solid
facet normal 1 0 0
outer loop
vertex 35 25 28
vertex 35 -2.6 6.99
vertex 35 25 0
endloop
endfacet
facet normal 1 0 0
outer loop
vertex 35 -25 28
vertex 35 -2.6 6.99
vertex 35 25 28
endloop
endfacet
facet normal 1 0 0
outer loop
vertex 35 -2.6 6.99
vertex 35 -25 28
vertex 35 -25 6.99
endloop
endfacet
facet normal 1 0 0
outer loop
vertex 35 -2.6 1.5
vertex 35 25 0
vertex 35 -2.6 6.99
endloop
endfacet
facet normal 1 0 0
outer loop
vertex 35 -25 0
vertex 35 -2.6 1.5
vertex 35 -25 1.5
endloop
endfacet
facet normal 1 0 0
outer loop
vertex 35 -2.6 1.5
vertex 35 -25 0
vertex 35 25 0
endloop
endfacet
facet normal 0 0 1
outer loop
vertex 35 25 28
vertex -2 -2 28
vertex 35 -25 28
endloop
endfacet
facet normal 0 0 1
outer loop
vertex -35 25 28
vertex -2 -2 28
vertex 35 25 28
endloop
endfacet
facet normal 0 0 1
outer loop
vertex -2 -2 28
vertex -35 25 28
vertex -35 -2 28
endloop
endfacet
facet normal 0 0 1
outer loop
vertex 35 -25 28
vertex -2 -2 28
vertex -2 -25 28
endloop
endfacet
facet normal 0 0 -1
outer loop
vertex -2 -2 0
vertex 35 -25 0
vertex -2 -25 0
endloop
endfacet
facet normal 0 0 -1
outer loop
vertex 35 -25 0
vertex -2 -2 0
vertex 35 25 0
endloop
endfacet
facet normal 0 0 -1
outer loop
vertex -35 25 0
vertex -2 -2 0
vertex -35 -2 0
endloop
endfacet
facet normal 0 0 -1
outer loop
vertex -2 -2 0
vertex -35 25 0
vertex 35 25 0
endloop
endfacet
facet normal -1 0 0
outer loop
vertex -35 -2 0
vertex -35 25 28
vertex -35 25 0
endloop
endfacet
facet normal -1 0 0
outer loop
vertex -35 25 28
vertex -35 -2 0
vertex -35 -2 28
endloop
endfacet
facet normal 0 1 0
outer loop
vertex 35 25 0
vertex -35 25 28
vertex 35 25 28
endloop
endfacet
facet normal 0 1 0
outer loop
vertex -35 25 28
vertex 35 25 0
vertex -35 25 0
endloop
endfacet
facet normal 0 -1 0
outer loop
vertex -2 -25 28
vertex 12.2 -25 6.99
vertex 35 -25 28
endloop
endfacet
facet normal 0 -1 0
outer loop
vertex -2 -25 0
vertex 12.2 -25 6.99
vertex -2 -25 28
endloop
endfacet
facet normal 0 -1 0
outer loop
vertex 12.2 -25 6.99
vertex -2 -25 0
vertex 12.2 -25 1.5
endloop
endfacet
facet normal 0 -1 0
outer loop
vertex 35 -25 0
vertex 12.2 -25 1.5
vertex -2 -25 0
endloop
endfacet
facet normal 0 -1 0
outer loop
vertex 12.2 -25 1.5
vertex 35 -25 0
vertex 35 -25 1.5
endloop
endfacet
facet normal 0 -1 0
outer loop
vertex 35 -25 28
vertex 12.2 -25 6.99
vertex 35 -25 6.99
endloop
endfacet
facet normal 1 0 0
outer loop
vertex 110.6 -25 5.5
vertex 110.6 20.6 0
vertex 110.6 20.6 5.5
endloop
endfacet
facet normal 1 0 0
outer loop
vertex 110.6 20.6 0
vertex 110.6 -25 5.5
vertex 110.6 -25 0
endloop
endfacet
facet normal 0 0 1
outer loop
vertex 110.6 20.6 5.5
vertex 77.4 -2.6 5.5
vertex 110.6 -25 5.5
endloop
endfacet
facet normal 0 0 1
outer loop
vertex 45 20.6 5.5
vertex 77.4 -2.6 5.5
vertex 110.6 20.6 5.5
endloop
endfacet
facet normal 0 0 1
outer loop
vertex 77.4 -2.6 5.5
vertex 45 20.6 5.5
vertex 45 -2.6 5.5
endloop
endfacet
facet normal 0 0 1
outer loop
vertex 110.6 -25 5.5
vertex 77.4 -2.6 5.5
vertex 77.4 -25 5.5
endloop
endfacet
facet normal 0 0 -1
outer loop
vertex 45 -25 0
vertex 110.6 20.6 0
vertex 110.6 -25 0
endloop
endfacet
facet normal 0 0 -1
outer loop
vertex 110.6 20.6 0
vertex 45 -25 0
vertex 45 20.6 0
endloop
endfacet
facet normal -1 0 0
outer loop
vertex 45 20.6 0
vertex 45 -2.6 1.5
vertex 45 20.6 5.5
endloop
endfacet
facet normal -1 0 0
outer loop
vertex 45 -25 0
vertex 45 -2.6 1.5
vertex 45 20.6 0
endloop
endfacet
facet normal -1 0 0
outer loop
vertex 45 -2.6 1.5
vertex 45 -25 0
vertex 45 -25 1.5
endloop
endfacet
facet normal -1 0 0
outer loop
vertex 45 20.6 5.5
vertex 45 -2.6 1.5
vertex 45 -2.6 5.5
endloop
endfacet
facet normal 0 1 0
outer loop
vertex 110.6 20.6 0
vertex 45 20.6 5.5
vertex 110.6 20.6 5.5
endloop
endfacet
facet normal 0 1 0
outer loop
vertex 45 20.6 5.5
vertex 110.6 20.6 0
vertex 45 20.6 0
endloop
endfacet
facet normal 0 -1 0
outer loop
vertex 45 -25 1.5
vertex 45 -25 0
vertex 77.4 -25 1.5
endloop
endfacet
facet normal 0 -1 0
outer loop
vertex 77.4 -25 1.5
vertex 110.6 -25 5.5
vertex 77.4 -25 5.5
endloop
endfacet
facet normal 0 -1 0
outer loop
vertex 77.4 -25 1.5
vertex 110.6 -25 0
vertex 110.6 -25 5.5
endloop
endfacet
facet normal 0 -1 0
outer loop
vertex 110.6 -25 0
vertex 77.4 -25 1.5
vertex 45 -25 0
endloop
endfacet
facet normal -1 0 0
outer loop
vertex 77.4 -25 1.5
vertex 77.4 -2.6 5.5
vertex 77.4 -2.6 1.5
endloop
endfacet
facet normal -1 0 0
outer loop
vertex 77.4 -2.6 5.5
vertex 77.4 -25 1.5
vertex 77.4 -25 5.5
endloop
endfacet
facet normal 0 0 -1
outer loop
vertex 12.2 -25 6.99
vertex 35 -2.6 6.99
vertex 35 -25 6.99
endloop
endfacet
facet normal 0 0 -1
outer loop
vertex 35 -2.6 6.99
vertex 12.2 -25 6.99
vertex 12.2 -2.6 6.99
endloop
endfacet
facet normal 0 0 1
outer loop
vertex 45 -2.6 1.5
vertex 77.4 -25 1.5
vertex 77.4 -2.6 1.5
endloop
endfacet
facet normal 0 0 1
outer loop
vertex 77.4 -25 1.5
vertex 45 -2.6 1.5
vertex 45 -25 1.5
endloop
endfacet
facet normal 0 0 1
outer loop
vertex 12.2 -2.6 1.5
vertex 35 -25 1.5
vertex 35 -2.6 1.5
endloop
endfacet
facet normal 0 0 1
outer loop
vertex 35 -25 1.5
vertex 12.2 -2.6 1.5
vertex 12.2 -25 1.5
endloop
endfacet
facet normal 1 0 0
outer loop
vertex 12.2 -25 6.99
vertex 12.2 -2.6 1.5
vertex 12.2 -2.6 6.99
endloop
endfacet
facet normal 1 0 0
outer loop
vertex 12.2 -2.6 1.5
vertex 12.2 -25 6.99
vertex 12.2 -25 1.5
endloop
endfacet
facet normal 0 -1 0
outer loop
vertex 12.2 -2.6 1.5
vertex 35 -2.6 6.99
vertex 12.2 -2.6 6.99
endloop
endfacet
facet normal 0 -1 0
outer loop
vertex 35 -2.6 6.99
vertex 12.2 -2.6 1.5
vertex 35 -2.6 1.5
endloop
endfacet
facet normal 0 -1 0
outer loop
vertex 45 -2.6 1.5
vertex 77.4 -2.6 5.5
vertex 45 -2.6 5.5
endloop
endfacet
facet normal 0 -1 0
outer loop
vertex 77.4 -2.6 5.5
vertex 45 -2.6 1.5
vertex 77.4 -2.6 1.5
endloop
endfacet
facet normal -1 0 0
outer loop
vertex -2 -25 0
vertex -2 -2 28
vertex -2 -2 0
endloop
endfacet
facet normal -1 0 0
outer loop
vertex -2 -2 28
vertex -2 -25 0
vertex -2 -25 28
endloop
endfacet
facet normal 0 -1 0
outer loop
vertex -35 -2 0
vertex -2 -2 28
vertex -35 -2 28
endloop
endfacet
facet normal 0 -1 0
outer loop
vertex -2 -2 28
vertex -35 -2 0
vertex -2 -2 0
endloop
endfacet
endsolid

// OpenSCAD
// Two-part enclosure for a small electronics board (e.g. Arduino-based temperature logger)
// Print orientation: both parts rest on the bed (z = 0), side by side, 10 mm apart in X.
// The box is open-topped; the lid is a plate with a lip that slides into the box opening.

// ---------------- Parameters ----------------
box_x      = 70;    // box outer length (X)
box_y      = 50;    // box outer width (Y)
box_h      = 30;    // box outer height (Z)
wall       = 2;     // box wall thickness
floor      = 2;     // box floor thickness
lip_t      = 1.5;   // lid lip thickness
lip_h      = 4;     // lid lip height (extends above the plate)
lip_x      = 65.6;  // lid lip outer length (X)
lip_y      = 45.6;  // lid lip outer width (Y)
clearance  = 0.2;   // clearance between lip inner size and box opening
gap        = 10;    // horizontal gap between the two parts
eps        = 0.5;   // cutter overshoot past faces

$fn = 64;

// Derived: lid plate thickness = lip_t + lip_h = 5.5 mm
lid_t = lip_t + lip_h;

// Lip inner size (with clearance on each side)
lip_x_i = lip_x - 2 * clearance;   // 65.2
lip_y_i = lip_y - 2 * clearance;   // 45.2

// Box opening size (inner, above floor and walls)
open_x = box_x - 2 * wall;         // 66
open_y = box_y - 2 * wall;         // 46

// ---------------- Model ----------------
difference() {
    union() {
        // Part 1: box
        translate([-box_x / 2, -box_y / 2, 0])
            cube([box_x, box_y, box_h - floor]);   // floor included in height

        // Part 2: lid (printed upside down)
        translate([box_x / 2 + gap, -box_y / 2, 0])
            cube([lip_x, lip_y, lid_t]);            // plate + lip, centred in X/Y
    }

    // Cut the lip recess into the lid plate, leaving the lip standing above it
    translate([box_x / 2 + gap - lip_x / 2, -box_y / 2 - lip_y / 2, lip_t])
        cube([lip_x_i, lip_y_i, lid_t - 0.01]);

    // Cut the box opening from the top of the box (through the walls and floor)
    translate([-box_x / 2 - open_x / 2, -box_y / 2 - open_y / 2, -eps])
        cube([open_x, open_y, box_h + 2 * eps]);
}
